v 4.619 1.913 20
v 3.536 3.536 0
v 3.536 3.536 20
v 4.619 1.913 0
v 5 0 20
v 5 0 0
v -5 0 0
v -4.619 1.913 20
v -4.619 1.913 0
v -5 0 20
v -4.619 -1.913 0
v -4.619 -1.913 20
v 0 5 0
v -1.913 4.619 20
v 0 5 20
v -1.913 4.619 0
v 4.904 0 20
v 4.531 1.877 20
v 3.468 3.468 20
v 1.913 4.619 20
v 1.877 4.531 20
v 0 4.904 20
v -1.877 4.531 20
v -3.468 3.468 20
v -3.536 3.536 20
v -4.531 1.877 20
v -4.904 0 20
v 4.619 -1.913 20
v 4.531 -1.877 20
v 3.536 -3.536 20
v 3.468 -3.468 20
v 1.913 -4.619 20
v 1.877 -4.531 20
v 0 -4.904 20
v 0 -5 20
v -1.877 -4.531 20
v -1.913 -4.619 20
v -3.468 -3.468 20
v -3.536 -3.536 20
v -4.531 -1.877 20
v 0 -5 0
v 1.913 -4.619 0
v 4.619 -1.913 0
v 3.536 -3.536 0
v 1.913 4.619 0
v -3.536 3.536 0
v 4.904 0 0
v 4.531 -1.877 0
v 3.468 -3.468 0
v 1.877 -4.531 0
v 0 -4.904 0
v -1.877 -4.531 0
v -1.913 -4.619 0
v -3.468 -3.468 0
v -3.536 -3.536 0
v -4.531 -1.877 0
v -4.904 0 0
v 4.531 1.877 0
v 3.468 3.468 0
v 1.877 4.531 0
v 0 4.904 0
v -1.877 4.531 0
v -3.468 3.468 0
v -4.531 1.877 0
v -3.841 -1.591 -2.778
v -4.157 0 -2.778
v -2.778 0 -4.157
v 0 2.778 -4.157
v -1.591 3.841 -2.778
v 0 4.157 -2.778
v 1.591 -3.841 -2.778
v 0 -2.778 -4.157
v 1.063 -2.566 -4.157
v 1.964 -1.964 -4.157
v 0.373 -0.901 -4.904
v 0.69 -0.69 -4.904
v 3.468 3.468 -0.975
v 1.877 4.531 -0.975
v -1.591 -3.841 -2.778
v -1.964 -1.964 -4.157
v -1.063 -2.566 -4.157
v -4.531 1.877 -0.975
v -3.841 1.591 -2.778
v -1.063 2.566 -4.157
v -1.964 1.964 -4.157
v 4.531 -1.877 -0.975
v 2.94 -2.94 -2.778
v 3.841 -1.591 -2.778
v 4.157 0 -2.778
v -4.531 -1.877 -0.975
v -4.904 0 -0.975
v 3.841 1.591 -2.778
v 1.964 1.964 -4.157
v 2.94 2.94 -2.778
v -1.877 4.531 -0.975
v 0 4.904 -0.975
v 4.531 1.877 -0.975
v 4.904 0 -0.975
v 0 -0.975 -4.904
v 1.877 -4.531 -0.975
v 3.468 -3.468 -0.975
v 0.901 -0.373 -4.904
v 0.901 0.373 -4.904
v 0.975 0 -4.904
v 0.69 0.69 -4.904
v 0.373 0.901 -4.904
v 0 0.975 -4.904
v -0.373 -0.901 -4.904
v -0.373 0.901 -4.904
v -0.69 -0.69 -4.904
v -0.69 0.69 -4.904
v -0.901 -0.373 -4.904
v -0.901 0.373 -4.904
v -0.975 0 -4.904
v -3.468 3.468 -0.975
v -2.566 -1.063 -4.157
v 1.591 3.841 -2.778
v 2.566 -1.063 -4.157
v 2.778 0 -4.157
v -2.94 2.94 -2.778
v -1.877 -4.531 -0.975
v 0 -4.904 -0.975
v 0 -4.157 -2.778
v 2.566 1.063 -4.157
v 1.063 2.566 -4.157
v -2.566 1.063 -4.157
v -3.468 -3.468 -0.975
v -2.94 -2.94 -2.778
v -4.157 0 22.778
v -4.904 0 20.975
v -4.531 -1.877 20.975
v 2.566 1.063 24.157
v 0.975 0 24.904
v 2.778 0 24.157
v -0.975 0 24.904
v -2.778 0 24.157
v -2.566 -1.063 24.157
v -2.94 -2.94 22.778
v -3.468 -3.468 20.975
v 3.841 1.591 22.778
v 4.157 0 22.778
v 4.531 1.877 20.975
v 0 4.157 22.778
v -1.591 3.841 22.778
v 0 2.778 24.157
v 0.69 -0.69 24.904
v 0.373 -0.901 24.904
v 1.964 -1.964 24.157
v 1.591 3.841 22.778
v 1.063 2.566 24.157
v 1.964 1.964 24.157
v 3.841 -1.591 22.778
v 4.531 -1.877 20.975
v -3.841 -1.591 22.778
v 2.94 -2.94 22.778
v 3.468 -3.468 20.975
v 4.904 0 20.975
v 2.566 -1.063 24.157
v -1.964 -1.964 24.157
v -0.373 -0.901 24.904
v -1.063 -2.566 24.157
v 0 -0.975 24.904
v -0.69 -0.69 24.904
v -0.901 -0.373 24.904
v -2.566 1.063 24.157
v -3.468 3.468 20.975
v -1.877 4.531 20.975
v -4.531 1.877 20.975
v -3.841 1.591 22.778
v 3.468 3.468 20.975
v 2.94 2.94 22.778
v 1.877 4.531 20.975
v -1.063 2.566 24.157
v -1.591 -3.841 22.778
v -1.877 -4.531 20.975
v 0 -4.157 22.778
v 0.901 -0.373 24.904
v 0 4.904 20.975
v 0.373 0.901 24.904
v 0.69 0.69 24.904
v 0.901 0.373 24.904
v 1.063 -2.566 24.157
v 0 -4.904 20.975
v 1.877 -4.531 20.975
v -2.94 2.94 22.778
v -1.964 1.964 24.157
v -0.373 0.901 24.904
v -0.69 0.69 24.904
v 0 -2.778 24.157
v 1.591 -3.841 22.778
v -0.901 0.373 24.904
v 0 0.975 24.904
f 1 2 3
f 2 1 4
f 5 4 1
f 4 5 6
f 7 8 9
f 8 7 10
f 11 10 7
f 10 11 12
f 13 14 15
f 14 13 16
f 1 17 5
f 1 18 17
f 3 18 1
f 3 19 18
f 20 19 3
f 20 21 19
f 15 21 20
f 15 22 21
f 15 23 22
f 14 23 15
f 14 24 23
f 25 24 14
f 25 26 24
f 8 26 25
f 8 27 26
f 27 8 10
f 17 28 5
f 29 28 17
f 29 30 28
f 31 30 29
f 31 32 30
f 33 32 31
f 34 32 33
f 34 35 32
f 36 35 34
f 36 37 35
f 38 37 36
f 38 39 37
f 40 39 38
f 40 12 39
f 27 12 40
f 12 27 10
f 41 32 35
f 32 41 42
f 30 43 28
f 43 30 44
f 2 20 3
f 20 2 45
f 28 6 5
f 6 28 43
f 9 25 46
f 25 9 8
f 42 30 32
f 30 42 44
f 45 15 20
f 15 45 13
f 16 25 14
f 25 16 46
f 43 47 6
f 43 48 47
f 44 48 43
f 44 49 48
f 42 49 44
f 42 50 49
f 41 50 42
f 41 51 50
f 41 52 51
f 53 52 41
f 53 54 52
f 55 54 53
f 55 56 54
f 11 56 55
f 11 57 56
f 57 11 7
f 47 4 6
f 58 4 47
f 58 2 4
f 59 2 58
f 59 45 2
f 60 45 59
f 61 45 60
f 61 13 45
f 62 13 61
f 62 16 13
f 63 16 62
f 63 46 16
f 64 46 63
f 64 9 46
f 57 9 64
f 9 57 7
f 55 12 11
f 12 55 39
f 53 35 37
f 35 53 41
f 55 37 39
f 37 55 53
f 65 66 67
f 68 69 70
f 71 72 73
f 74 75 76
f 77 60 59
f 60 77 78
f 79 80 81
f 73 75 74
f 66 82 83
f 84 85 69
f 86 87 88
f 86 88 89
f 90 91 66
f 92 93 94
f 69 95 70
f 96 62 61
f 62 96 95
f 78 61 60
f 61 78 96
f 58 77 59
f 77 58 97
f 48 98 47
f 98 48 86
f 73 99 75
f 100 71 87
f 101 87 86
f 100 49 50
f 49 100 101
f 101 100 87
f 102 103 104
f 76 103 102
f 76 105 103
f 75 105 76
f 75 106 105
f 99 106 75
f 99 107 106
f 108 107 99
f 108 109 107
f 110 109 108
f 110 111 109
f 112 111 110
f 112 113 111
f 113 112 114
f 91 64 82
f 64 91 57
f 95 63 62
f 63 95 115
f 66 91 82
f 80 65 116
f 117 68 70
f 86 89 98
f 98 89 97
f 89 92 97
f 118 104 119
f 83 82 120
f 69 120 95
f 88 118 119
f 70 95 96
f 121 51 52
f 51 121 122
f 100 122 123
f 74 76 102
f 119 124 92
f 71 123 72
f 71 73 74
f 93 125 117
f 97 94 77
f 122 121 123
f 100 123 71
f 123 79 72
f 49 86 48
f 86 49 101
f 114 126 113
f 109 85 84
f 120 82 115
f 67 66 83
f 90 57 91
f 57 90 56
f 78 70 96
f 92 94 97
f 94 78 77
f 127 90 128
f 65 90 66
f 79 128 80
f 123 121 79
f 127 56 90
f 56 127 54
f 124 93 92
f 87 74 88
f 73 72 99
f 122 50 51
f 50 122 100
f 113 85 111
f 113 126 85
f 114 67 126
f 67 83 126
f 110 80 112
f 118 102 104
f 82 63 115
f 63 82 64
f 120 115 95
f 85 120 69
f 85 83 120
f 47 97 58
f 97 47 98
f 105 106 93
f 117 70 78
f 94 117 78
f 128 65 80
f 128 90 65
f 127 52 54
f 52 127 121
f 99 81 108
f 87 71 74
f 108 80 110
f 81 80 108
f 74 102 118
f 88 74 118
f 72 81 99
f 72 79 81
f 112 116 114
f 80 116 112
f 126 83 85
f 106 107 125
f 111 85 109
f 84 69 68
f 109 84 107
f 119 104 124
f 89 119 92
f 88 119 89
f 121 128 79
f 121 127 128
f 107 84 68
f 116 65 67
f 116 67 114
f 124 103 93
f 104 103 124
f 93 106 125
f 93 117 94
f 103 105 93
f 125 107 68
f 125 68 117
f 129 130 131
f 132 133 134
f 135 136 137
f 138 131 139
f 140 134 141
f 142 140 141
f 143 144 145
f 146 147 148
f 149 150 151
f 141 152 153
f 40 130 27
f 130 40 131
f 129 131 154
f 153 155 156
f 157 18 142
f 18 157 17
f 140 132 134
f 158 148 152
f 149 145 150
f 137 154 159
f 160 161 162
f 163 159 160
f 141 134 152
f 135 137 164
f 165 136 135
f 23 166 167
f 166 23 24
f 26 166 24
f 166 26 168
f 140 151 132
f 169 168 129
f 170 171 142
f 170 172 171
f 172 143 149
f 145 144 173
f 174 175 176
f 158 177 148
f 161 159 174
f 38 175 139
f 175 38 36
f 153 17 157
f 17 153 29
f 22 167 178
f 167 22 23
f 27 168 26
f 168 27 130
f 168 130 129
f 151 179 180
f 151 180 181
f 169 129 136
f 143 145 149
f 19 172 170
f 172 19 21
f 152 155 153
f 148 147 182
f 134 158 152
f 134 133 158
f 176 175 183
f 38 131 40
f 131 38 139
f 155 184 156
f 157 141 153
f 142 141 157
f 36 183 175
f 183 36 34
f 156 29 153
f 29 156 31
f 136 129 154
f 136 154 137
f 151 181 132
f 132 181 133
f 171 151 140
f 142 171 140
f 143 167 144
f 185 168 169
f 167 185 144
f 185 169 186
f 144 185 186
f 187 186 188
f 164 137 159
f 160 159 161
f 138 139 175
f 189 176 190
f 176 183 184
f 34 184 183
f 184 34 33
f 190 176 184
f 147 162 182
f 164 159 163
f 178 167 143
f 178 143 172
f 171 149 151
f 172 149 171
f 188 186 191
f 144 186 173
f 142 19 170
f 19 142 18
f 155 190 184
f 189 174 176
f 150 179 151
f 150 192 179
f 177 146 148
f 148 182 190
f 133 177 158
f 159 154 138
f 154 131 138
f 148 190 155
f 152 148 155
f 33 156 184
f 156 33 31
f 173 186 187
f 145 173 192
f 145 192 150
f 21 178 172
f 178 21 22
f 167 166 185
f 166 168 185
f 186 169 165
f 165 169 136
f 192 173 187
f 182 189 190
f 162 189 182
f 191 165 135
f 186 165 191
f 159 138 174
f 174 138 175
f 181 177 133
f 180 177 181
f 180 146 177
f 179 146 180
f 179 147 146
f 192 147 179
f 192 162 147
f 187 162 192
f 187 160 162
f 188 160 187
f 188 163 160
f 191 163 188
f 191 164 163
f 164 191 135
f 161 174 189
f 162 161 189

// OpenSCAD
// The exact-geometry audit's case x02 (docs/audits/exact-geometry-rust.md).
// volume: 2094.3951023931954
union() { cylinder(r=5, h=20); sphere(5); translate([0,0,20]) sphere(5); }
